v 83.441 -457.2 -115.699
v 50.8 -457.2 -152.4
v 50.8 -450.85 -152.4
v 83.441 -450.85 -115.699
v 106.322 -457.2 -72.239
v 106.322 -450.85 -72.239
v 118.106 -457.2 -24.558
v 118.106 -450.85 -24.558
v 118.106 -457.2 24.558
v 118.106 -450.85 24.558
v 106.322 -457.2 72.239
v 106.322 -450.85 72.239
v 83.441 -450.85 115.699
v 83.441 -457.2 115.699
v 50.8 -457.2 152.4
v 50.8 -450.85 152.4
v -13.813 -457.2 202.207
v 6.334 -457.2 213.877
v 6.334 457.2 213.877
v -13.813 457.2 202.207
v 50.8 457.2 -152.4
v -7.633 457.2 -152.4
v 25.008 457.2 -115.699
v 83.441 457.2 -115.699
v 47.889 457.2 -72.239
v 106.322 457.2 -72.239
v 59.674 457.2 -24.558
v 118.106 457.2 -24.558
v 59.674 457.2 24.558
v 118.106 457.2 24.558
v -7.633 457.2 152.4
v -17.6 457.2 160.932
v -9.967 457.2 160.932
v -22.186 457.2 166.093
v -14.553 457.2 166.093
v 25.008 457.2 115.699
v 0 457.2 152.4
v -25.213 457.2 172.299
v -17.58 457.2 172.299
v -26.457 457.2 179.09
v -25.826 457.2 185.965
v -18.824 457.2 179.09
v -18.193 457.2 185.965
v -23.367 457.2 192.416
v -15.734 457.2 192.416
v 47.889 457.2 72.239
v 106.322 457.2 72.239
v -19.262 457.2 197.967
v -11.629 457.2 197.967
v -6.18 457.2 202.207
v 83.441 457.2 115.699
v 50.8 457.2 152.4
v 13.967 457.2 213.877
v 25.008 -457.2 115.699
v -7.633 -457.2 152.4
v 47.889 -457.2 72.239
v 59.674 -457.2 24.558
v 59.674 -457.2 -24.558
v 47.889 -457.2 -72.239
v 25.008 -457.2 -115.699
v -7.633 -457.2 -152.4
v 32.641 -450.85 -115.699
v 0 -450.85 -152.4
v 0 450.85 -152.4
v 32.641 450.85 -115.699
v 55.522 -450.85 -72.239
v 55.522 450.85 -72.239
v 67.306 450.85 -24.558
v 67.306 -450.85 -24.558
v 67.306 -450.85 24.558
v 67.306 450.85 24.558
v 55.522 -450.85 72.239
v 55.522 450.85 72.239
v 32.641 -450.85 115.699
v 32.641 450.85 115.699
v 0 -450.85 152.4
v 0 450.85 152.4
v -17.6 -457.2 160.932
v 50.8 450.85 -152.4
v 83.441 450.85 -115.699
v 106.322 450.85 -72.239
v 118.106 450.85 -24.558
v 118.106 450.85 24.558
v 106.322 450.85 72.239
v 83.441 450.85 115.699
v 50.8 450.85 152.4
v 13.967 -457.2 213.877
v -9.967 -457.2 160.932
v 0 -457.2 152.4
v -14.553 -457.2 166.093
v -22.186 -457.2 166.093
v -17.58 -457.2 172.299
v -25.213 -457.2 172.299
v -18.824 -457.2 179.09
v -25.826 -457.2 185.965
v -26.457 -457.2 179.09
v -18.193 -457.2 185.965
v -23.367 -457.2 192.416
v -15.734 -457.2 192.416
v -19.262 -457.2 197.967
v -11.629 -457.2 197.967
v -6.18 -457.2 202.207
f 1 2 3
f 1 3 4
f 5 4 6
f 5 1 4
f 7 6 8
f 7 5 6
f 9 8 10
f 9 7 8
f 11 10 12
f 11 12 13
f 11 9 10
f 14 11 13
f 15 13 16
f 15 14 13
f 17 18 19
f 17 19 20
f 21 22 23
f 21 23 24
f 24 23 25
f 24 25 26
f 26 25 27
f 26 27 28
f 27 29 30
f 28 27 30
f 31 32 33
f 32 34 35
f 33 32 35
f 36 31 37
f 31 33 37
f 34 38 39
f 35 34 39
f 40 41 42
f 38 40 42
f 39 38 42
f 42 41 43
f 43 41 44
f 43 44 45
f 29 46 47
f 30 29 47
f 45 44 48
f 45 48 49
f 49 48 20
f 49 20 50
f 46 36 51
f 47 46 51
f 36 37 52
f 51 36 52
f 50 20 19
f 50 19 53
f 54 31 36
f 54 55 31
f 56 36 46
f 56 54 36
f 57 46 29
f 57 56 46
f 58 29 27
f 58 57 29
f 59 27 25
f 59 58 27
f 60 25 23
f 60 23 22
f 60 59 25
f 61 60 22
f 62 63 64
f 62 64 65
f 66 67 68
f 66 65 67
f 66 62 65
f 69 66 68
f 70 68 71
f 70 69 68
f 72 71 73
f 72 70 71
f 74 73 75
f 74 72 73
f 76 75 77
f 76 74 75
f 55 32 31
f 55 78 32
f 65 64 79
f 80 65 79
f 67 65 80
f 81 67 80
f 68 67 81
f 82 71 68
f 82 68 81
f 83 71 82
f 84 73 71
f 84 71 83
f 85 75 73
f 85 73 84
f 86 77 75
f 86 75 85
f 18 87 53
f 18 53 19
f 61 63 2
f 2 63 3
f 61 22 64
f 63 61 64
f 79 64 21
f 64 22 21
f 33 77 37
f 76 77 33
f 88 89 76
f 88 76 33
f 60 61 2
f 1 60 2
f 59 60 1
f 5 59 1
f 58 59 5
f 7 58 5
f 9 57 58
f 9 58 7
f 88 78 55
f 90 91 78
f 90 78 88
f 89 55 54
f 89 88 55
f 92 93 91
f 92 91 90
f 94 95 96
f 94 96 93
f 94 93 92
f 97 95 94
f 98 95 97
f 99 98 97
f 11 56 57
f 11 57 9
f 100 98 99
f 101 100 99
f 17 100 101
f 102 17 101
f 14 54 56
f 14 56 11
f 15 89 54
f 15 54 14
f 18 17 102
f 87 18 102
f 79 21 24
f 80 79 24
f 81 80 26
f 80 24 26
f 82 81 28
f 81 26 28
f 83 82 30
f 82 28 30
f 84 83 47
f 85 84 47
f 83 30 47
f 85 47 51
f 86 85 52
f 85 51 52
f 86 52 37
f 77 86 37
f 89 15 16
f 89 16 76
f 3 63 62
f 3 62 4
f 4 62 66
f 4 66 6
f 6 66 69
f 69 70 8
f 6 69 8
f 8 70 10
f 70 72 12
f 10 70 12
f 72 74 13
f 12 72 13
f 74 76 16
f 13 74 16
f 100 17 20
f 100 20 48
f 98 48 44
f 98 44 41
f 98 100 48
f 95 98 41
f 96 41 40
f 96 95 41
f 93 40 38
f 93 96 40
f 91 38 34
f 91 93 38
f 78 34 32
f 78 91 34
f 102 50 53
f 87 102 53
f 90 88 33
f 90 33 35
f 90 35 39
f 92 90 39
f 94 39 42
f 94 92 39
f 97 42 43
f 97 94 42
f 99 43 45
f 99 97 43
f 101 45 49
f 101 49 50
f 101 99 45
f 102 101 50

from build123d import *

# Parameters (mm, degrees)
F1_DEPTH = 457.2
F3_DEPTH = 6.35


with BuildPart() as f1:
    # F0 (on Front) → F1 (new body, symmetric)
    with BuildSketch(Plane.XZ):
        with BuildLine():
            Line((-7.632641, -152.4), (0, -152.4))
            ThreePointArc((0, -152.4), (68.795833, 0), (0, 152.4))
            Line((0, 152.4), (-9.967424, 160.932384))
            ThreePointArc((-9.967424, 160.932384), (-18.7435, 182.548823), (-6.180466, 202.207412))
            Line((-6.180466, 202.207412), (13.96697, 213.877112))
            Line((13.96697, 213.877112), (6.334329, 213.877112))
            Line((6.334329, 213.877112), (-13.813108, 202.207412))
            ThreePointArc((-13.813108, 202.207412), (-26.376141, 182.548823), (-17.600065, 160.932384))
            Line((-17.600065, 160.932384), (-7.632641, 152.4))
            ThreePointArc((-7.632641, 152.4), (61.163192, 0), (-7.632641, -152.4))
        make_face()
    extrude(amount=F1_DEPTH, both=True)

    # F2 (on face) → F3 (join)
    with BuildSketch(Plane.XZ.offset(457.2)):
        with BuildLine():
            Line((50.8, 152.4), (0, 152.4))
            ThreePointArc((0, 152.4), (68.795833, 0), (0, -152.4))
            Line((0, -152.4), (50.8, -152.4))
            ThreePointArc((50.8, -152.4), (119.595833, 0), (50.8, 152.4))
        make_face()
    extrude(amount=-F3_DEPTH)

    # F4: F1 across plane


with BuildPart() as f1_1:
    add(f1.part)
    add(f1.part.mirror(Plane.XZ))


solid = f1_1.part
